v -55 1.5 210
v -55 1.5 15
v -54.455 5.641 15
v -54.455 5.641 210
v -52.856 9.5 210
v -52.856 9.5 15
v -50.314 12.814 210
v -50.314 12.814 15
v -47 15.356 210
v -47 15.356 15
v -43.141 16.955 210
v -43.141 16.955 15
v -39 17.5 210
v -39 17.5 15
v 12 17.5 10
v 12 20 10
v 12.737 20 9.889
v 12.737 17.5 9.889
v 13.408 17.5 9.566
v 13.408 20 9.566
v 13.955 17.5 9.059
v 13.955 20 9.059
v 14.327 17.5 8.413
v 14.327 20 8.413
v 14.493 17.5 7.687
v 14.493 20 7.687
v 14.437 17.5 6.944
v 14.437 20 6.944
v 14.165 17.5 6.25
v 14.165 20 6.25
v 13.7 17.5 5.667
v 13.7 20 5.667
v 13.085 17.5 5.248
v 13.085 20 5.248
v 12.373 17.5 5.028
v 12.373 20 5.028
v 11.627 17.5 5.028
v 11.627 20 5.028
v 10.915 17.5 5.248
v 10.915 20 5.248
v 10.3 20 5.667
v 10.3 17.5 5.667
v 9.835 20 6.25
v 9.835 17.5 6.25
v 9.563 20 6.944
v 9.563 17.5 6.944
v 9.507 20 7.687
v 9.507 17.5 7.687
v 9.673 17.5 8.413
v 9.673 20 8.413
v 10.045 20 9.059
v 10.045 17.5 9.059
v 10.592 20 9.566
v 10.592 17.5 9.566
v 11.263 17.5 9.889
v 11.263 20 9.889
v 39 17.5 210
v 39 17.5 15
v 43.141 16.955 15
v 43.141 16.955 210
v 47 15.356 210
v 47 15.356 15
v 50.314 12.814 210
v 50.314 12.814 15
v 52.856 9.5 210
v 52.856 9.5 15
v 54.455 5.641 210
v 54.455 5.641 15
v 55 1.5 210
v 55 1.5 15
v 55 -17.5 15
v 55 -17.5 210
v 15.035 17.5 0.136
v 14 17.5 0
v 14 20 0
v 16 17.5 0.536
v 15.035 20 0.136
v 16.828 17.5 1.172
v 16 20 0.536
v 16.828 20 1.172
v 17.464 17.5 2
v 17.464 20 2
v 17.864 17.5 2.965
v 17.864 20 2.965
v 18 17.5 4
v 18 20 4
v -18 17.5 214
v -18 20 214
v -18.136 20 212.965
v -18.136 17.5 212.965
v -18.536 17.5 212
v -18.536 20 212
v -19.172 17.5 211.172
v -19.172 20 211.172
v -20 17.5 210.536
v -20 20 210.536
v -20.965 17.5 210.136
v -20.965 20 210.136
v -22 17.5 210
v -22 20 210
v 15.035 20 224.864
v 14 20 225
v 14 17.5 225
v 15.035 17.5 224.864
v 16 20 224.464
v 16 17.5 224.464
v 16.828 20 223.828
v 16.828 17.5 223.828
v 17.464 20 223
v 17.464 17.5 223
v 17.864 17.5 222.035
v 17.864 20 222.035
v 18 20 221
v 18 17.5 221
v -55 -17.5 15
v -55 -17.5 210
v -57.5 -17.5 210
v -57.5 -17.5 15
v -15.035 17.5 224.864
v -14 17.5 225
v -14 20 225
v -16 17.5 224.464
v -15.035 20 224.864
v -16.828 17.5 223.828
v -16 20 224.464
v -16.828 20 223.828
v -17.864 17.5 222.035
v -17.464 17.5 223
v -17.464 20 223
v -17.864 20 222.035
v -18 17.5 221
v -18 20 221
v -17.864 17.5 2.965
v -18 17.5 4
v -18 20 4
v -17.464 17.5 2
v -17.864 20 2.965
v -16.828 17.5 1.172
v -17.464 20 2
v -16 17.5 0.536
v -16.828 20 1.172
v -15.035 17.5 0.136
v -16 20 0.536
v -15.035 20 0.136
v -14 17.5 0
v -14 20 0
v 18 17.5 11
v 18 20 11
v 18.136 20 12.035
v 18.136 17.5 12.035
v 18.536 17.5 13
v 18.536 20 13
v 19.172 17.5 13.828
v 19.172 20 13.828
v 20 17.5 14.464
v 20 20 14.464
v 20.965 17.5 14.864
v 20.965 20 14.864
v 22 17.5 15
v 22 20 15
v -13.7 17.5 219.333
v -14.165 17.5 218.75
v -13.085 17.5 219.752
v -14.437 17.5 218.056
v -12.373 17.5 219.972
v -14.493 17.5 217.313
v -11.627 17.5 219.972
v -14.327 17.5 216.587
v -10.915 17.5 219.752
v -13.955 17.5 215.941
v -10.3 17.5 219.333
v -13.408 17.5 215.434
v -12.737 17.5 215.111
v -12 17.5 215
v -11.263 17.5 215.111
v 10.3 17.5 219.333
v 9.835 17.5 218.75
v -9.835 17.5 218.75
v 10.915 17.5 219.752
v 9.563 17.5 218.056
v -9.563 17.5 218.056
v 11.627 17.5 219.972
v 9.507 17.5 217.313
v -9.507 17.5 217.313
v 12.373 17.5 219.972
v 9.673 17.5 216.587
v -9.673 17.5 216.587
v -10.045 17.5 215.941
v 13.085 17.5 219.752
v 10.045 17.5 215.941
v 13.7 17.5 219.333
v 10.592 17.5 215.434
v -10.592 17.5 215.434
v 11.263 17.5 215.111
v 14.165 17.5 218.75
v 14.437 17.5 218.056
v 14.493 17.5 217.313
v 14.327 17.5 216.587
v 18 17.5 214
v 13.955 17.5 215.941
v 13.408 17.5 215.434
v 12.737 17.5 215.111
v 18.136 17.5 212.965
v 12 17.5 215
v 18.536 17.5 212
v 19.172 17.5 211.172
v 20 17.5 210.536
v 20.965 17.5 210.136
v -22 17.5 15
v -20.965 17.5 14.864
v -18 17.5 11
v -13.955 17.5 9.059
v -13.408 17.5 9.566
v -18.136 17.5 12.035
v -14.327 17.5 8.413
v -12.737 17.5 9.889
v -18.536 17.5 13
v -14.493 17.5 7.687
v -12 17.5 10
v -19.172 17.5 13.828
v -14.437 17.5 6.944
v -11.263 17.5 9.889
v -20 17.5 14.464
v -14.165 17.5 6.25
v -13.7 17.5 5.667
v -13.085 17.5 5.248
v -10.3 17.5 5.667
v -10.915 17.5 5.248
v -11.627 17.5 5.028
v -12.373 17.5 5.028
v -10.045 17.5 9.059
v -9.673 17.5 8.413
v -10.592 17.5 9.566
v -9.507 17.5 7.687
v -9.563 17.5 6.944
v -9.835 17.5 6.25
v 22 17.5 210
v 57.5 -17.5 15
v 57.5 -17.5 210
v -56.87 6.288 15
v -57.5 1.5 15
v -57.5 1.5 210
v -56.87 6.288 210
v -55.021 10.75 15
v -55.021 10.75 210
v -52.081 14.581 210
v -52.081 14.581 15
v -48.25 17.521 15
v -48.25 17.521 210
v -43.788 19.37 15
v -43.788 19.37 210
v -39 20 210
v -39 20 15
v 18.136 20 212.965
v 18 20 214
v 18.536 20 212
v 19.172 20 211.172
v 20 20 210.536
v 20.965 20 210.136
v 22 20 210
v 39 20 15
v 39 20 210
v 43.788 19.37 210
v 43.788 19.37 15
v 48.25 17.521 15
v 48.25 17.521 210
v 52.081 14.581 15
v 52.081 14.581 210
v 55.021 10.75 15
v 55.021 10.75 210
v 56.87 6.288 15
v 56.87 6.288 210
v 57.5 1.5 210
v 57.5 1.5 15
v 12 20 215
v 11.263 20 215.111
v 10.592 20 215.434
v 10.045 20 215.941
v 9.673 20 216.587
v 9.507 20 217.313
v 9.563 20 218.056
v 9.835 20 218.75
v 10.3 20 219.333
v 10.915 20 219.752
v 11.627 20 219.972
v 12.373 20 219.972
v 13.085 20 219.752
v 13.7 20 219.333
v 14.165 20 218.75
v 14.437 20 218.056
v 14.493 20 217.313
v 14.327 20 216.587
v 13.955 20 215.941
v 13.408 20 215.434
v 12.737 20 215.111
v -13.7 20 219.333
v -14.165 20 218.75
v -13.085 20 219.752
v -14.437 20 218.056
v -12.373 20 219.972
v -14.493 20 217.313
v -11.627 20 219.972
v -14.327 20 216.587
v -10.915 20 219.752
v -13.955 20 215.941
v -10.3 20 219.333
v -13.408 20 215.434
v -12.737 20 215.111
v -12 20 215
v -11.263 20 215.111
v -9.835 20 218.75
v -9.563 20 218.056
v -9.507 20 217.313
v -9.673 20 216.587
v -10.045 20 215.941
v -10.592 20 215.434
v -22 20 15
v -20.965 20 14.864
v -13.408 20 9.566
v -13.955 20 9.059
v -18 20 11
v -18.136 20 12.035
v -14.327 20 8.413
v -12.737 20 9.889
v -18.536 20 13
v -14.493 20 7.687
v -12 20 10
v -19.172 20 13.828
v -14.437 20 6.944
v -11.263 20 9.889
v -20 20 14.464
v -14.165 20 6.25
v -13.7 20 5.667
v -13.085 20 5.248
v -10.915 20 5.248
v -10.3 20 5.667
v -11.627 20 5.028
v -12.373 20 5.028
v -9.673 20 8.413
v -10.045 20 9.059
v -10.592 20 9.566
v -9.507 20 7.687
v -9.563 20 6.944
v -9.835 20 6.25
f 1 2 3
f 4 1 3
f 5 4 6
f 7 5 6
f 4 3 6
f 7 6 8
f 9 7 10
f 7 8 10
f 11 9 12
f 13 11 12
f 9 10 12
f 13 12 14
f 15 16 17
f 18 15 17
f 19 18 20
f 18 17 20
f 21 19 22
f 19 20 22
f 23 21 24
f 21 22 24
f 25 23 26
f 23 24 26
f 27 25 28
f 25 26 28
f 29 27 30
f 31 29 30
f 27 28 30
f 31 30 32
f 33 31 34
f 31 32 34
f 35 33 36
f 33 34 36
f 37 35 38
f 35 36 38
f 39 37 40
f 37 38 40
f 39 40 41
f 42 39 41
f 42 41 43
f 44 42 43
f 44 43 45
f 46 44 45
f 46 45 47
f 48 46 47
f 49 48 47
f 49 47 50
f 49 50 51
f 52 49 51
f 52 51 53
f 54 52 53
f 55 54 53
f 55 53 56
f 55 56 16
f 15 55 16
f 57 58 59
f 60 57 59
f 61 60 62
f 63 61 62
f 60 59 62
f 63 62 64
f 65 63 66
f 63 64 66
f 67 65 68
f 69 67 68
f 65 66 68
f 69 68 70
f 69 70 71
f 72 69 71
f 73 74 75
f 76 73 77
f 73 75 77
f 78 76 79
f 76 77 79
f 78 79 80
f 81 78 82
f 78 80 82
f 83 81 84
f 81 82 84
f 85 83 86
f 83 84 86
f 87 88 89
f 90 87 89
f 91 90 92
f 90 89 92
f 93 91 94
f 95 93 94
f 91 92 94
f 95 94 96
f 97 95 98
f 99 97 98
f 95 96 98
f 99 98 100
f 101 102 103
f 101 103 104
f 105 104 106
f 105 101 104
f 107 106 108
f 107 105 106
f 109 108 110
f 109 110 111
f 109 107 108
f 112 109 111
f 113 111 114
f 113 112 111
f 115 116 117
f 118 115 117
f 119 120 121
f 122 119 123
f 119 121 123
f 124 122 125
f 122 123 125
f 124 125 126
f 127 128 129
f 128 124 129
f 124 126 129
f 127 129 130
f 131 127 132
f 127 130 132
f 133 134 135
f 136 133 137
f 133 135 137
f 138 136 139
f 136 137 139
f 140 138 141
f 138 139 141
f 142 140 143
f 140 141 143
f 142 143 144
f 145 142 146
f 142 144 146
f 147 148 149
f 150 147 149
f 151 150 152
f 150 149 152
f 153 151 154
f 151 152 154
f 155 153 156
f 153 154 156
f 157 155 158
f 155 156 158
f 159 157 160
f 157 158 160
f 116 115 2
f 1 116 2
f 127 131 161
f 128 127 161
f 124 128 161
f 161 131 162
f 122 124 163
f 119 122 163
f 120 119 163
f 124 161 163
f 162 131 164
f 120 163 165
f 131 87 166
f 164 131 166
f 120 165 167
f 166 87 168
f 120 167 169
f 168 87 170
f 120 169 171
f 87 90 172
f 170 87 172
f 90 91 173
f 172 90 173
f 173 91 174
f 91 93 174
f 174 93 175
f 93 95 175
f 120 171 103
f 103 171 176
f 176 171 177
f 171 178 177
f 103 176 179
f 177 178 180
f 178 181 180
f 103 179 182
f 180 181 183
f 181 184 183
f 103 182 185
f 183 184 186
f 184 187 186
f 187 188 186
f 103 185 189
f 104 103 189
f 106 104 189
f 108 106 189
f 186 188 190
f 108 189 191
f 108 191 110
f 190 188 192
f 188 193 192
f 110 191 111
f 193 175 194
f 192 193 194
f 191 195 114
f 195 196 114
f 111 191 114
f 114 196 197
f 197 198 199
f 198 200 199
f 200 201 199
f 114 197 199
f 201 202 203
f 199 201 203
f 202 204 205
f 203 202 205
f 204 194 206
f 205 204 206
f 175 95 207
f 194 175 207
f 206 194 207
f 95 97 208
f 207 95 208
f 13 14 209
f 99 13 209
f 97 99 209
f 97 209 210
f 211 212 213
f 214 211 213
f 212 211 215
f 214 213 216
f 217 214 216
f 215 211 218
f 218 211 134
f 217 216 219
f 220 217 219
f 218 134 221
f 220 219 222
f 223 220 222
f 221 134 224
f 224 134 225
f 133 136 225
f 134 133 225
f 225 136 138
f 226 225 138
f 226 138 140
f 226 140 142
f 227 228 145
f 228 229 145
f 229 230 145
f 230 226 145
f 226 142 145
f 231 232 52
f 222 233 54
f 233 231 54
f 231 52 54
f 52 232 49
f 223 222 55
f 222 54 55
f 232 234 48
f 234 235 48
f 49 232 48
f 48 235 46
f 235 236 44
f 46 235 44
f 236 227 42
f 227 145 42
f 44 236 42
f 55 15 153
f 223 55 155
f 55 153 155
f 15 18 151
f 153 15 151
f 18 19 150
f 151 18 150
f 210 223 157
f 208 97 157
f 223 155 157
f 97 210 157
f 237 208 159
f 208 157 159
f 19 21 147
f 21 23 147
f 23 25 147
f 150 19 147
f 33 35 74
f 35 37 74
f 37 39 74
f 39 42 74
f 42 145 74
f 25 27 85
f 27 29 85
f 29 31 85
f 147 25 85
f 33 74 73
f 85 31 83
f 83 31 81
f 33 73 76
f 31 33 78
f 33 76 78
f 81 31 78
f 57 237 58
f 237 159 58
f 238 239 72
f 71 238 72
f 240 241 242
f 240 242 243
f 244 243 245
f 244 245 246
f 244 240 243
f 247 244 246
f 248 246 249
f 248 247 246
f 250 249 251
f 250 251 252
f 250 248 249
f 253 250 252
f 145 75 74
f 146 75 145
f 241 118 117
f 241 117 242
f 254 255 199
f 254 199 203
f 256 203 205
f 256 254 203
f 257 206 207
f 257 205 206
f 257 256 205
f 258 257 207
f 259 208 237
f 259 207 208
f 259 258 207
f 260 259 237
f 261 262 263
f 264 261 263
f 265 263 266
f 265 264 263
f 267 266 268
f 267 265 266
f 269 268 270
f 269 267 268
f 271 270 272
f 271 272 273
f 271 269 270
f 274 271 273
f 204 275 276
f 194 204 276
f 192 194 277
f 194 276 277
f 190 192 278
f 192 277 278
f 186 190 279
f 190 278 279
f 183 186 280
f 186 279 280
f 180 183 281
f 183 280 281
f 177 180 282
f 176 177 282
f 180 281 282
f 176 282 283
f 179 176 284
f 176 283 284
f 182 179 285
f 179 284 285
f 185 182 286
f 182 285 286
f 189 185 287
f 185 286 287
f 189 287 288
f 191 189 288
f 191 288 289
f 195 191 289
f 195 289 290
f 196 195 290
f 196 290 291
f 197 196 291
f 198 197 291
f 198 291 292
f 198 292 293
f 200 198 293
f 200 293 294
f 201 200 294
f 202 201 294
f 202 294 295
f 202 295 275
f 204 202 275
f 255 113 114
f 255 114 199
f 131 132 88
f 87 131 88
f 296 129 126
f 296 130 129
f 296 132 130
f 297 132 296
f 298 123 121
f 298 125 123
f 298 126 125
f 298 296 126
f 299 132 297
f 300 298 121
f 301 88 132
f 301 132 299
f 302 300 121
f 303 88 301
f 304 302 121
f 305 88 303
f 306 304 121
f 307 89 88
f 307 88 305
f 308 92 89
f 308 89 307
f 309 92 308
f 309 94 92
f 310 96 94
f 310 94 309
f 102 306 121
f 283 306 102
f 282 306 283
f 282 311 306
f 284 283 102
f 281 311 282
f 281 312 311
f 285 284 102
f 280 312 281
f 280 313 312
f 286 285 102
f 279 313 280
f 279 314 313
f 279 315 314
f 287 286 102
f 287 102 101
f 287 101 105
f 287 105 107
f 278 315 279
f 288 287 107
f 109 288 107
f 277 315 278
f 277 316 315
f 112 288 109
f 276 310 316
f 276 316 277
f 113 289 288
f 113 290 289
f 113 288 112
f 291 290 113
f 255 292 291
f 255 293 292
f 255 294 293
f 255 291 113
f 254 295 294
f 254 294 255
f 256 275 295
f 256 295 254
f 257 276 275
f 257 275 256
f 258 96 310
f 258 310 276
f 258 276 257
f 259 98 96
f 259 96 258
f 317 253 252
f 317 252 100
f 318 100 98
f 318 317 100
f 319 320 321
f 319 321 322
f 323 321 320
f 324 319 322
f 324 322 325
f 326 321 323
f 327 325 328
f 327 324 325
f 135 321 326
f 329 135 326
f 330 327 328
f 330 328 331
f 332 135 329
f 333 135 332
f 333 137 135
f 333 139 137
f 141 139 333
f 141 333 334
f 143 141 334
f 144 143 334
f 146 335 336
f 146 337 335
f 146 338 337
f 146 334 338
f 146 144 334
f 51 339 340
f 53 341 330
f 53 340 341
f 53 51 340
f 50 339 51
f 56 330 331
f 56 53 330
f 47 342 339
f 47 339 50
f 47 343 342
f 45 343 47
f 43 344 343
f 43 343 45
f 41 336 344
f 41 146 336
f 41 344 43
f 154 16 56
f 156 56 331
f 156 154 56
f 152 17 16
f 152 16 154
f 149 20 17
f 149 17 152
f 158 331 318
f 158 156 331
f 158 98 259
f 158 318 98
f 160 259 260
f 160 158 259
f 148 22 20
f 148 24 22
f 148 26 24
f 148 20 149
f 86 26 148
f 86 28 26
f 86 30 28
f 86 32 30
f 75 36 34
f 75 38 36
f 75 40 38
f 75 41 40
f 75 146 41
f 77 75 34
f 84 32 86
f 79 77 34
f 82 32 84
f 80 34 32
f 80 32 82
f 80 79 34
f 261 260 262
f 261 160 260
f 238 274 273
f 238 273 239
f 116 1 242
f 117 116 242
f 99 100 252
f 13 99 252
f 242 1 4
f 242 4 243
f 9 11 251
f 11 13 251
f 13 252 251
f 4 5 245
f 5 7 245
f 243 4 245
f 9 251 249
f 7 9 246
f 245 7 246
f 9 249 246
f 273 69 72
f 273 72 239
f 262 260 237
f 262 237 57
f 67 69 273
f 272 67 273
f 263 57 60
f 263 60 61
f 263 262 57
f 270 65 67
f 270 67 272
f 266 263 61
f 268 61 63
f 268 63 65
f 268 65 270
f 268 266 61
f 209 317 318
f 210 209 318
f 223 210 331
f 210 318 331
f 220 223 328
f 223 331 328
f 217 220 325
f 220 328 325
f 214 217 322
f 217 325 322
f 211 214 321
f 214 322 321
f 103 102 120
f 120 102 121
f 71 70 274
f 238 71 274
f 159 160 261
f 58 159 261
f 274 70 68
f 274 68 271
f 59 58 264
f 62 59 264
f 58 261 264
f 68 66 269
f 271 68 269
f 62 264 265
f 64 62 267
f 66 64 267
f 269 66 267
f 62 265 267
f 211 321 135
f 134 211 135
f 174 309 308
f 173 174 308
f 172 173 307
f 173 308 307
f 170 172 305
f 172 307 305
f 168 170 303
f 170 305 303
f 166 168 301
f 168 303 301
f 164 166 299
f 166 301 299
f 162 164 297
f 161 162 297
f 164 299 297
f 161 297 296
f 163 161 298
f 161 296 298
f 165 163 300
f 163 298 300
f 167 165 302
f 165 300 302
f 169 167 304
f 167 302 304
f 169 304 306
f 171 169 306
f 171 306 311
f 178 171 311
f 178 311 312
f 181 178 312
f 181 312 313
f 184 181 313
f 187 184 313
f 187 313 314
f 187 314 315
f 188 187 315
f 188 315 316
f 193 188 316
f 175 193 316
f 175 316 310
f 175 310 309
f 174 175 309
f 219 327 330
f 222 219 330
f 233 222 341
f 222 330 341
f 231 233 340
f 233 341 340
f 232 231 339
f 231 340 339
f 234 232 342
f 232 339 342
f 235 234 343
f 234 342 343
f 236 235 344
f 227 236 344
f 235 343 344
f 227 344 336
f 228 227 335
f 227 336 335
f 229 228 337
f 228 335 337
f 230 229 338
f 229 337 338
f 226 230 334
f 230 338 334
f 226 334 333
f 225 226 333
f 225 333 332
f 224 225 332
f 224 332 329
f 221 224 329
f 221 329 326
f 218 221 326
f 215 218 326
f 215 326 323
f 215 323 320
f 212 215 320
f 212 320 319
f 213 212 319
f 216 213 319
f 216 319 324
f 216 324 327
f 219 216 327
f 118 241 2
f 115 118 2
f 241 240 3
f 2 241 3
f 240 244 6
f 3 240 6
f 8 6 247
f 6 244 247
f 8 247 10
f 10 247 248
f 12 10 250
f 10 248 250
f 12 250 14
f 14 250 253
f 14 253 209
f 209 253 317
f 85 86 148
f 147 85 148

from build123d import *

# Parameters (mm, degrees)
EXTRUDE_1_DEPTH     = 225
SHELL_2_T           = 2.5
SKETCH_2_R          = 2.5
CUT_EXTRUDE_1_DEPTH = 236.239239924


with BuildPart() as part:
    # 草图1 → 凸台-拉伸1 (new body)
    with BuildSketch(Plane.XY):
        with BuildLine():
            Line((-39, 17.5), (39, 17.5))
            ThreePointArc((39, 17.5), (50.313708499, 12.813708499), (55, 1.5))
            Line((55, 1.5), (55, -17.5))
            Line((55, -17.5), (-55, -17.5))
            Line((-55, -17.5), (-55, 1.5))
            ThreePointArc((-55, 1.5), (-50.313708499, 12.813708499), (-39, 17.5))
        make_face()
    extrude(amount=EXTRUDE_1_DEPTH)

    # 抽壳2
    shell_2_openings = [part.faces().sort_by_distance(p)[0] for p in [
        (0, -17.5, 112.5),
        (0, -0.40911681, 0),
        (0, -0.40911681, 225),
    ]]
    offset(amount=SHELL_2_T, openings=shell_2_openings, kind=Kind.INTERSECTION)

    # 草图2 → 切除-拉伸1 (cut, through all)
    with BuildSketch(Plane(origin=(0, 20, 0), x_dir=(1, 0, 0), z_dir=(0, 1, 0))):
        with Locations(Location((-12, -7.5, 0), (0, 0, 270))):
            Circle(SKETCH_2_R)
        with Locations(Location((12, -7.5, 0), (0, 0, 270))):
            Circle(SKETCH_2_R)
        with Locations(Location((-12, -217.5, 0), (0, 0, 90))):
            Circle(SKETCH_2_R)
        with Locations(Location((12, -217.5, 0), (0, 0, 90))):
            Circle(SKETCH_2_R)
        with BuildLine():
            Line((-14, 0), (-74.033168475, 0))
            Line((-74.033168475, 0), (-74.033168475, -15))
            Line((-74.033168475, -15), (-57.5, -15))
            Line((-57.5, -15), (-22, -15))
            ThreePointArc((-22, -15), (-19.171572875, -13.828427125), (-18, -11))
            Line((-18, -11), (-18, -4))
            ThreePointArc((-18, -4), (-16.828427125, -1.171572875), (-14, 0))
        make_face()
        with BuildLine():
            Line((57.5, -15), (57.5, 0))
            Line((57.5, 0), (14, 0))
            ThreePointArc((14, 0), (16.828427125, -1.171572875), (18, -4))
            Line((18, -4), (18, -11))
            ThreePointArc((18, -11), (19.171572875, -13.828427125), (22, -15))
            Line((22, -15), (57.5, -15))
        make_face()
        with BuildLine():
            Line((18, -221), (18, -214))
            ThreePointArc((18, -214), (19.171572875, -211.171572875), (22, -210))
            Line((22, -210), (57.5, -210))
            Line((57.5, -210), (57.5, -225))
            Line((57.5, -225), (14, -225))
            ThreePointArc((14, -225), (16.828427125, -223.828427125), (18, -221))
        make_face()
        with BuildLine():
            Line((-18, -221), (-18, -214))
            ThreePointArc((-18, -214), (-19.171572875, -211.171572875), (-22, -210))
            Line((-22, -210), (-57.5, -210))
            Line((-57.5, -210), (-74.033168475, -210))
            Line((-74.033168475, -210), (-74.033168475, -225))
            Line((-74.033168475, -225), (-14, -225))
            ThreePointArc((-14, -225), (-16.828427125, -223.828427125), (-18, -221))
        make_face()
    extrude(amount=-CUT_EXTRUDE_1_DEPTH, mode=Mode.SUBTRACT)


solid = part.part
